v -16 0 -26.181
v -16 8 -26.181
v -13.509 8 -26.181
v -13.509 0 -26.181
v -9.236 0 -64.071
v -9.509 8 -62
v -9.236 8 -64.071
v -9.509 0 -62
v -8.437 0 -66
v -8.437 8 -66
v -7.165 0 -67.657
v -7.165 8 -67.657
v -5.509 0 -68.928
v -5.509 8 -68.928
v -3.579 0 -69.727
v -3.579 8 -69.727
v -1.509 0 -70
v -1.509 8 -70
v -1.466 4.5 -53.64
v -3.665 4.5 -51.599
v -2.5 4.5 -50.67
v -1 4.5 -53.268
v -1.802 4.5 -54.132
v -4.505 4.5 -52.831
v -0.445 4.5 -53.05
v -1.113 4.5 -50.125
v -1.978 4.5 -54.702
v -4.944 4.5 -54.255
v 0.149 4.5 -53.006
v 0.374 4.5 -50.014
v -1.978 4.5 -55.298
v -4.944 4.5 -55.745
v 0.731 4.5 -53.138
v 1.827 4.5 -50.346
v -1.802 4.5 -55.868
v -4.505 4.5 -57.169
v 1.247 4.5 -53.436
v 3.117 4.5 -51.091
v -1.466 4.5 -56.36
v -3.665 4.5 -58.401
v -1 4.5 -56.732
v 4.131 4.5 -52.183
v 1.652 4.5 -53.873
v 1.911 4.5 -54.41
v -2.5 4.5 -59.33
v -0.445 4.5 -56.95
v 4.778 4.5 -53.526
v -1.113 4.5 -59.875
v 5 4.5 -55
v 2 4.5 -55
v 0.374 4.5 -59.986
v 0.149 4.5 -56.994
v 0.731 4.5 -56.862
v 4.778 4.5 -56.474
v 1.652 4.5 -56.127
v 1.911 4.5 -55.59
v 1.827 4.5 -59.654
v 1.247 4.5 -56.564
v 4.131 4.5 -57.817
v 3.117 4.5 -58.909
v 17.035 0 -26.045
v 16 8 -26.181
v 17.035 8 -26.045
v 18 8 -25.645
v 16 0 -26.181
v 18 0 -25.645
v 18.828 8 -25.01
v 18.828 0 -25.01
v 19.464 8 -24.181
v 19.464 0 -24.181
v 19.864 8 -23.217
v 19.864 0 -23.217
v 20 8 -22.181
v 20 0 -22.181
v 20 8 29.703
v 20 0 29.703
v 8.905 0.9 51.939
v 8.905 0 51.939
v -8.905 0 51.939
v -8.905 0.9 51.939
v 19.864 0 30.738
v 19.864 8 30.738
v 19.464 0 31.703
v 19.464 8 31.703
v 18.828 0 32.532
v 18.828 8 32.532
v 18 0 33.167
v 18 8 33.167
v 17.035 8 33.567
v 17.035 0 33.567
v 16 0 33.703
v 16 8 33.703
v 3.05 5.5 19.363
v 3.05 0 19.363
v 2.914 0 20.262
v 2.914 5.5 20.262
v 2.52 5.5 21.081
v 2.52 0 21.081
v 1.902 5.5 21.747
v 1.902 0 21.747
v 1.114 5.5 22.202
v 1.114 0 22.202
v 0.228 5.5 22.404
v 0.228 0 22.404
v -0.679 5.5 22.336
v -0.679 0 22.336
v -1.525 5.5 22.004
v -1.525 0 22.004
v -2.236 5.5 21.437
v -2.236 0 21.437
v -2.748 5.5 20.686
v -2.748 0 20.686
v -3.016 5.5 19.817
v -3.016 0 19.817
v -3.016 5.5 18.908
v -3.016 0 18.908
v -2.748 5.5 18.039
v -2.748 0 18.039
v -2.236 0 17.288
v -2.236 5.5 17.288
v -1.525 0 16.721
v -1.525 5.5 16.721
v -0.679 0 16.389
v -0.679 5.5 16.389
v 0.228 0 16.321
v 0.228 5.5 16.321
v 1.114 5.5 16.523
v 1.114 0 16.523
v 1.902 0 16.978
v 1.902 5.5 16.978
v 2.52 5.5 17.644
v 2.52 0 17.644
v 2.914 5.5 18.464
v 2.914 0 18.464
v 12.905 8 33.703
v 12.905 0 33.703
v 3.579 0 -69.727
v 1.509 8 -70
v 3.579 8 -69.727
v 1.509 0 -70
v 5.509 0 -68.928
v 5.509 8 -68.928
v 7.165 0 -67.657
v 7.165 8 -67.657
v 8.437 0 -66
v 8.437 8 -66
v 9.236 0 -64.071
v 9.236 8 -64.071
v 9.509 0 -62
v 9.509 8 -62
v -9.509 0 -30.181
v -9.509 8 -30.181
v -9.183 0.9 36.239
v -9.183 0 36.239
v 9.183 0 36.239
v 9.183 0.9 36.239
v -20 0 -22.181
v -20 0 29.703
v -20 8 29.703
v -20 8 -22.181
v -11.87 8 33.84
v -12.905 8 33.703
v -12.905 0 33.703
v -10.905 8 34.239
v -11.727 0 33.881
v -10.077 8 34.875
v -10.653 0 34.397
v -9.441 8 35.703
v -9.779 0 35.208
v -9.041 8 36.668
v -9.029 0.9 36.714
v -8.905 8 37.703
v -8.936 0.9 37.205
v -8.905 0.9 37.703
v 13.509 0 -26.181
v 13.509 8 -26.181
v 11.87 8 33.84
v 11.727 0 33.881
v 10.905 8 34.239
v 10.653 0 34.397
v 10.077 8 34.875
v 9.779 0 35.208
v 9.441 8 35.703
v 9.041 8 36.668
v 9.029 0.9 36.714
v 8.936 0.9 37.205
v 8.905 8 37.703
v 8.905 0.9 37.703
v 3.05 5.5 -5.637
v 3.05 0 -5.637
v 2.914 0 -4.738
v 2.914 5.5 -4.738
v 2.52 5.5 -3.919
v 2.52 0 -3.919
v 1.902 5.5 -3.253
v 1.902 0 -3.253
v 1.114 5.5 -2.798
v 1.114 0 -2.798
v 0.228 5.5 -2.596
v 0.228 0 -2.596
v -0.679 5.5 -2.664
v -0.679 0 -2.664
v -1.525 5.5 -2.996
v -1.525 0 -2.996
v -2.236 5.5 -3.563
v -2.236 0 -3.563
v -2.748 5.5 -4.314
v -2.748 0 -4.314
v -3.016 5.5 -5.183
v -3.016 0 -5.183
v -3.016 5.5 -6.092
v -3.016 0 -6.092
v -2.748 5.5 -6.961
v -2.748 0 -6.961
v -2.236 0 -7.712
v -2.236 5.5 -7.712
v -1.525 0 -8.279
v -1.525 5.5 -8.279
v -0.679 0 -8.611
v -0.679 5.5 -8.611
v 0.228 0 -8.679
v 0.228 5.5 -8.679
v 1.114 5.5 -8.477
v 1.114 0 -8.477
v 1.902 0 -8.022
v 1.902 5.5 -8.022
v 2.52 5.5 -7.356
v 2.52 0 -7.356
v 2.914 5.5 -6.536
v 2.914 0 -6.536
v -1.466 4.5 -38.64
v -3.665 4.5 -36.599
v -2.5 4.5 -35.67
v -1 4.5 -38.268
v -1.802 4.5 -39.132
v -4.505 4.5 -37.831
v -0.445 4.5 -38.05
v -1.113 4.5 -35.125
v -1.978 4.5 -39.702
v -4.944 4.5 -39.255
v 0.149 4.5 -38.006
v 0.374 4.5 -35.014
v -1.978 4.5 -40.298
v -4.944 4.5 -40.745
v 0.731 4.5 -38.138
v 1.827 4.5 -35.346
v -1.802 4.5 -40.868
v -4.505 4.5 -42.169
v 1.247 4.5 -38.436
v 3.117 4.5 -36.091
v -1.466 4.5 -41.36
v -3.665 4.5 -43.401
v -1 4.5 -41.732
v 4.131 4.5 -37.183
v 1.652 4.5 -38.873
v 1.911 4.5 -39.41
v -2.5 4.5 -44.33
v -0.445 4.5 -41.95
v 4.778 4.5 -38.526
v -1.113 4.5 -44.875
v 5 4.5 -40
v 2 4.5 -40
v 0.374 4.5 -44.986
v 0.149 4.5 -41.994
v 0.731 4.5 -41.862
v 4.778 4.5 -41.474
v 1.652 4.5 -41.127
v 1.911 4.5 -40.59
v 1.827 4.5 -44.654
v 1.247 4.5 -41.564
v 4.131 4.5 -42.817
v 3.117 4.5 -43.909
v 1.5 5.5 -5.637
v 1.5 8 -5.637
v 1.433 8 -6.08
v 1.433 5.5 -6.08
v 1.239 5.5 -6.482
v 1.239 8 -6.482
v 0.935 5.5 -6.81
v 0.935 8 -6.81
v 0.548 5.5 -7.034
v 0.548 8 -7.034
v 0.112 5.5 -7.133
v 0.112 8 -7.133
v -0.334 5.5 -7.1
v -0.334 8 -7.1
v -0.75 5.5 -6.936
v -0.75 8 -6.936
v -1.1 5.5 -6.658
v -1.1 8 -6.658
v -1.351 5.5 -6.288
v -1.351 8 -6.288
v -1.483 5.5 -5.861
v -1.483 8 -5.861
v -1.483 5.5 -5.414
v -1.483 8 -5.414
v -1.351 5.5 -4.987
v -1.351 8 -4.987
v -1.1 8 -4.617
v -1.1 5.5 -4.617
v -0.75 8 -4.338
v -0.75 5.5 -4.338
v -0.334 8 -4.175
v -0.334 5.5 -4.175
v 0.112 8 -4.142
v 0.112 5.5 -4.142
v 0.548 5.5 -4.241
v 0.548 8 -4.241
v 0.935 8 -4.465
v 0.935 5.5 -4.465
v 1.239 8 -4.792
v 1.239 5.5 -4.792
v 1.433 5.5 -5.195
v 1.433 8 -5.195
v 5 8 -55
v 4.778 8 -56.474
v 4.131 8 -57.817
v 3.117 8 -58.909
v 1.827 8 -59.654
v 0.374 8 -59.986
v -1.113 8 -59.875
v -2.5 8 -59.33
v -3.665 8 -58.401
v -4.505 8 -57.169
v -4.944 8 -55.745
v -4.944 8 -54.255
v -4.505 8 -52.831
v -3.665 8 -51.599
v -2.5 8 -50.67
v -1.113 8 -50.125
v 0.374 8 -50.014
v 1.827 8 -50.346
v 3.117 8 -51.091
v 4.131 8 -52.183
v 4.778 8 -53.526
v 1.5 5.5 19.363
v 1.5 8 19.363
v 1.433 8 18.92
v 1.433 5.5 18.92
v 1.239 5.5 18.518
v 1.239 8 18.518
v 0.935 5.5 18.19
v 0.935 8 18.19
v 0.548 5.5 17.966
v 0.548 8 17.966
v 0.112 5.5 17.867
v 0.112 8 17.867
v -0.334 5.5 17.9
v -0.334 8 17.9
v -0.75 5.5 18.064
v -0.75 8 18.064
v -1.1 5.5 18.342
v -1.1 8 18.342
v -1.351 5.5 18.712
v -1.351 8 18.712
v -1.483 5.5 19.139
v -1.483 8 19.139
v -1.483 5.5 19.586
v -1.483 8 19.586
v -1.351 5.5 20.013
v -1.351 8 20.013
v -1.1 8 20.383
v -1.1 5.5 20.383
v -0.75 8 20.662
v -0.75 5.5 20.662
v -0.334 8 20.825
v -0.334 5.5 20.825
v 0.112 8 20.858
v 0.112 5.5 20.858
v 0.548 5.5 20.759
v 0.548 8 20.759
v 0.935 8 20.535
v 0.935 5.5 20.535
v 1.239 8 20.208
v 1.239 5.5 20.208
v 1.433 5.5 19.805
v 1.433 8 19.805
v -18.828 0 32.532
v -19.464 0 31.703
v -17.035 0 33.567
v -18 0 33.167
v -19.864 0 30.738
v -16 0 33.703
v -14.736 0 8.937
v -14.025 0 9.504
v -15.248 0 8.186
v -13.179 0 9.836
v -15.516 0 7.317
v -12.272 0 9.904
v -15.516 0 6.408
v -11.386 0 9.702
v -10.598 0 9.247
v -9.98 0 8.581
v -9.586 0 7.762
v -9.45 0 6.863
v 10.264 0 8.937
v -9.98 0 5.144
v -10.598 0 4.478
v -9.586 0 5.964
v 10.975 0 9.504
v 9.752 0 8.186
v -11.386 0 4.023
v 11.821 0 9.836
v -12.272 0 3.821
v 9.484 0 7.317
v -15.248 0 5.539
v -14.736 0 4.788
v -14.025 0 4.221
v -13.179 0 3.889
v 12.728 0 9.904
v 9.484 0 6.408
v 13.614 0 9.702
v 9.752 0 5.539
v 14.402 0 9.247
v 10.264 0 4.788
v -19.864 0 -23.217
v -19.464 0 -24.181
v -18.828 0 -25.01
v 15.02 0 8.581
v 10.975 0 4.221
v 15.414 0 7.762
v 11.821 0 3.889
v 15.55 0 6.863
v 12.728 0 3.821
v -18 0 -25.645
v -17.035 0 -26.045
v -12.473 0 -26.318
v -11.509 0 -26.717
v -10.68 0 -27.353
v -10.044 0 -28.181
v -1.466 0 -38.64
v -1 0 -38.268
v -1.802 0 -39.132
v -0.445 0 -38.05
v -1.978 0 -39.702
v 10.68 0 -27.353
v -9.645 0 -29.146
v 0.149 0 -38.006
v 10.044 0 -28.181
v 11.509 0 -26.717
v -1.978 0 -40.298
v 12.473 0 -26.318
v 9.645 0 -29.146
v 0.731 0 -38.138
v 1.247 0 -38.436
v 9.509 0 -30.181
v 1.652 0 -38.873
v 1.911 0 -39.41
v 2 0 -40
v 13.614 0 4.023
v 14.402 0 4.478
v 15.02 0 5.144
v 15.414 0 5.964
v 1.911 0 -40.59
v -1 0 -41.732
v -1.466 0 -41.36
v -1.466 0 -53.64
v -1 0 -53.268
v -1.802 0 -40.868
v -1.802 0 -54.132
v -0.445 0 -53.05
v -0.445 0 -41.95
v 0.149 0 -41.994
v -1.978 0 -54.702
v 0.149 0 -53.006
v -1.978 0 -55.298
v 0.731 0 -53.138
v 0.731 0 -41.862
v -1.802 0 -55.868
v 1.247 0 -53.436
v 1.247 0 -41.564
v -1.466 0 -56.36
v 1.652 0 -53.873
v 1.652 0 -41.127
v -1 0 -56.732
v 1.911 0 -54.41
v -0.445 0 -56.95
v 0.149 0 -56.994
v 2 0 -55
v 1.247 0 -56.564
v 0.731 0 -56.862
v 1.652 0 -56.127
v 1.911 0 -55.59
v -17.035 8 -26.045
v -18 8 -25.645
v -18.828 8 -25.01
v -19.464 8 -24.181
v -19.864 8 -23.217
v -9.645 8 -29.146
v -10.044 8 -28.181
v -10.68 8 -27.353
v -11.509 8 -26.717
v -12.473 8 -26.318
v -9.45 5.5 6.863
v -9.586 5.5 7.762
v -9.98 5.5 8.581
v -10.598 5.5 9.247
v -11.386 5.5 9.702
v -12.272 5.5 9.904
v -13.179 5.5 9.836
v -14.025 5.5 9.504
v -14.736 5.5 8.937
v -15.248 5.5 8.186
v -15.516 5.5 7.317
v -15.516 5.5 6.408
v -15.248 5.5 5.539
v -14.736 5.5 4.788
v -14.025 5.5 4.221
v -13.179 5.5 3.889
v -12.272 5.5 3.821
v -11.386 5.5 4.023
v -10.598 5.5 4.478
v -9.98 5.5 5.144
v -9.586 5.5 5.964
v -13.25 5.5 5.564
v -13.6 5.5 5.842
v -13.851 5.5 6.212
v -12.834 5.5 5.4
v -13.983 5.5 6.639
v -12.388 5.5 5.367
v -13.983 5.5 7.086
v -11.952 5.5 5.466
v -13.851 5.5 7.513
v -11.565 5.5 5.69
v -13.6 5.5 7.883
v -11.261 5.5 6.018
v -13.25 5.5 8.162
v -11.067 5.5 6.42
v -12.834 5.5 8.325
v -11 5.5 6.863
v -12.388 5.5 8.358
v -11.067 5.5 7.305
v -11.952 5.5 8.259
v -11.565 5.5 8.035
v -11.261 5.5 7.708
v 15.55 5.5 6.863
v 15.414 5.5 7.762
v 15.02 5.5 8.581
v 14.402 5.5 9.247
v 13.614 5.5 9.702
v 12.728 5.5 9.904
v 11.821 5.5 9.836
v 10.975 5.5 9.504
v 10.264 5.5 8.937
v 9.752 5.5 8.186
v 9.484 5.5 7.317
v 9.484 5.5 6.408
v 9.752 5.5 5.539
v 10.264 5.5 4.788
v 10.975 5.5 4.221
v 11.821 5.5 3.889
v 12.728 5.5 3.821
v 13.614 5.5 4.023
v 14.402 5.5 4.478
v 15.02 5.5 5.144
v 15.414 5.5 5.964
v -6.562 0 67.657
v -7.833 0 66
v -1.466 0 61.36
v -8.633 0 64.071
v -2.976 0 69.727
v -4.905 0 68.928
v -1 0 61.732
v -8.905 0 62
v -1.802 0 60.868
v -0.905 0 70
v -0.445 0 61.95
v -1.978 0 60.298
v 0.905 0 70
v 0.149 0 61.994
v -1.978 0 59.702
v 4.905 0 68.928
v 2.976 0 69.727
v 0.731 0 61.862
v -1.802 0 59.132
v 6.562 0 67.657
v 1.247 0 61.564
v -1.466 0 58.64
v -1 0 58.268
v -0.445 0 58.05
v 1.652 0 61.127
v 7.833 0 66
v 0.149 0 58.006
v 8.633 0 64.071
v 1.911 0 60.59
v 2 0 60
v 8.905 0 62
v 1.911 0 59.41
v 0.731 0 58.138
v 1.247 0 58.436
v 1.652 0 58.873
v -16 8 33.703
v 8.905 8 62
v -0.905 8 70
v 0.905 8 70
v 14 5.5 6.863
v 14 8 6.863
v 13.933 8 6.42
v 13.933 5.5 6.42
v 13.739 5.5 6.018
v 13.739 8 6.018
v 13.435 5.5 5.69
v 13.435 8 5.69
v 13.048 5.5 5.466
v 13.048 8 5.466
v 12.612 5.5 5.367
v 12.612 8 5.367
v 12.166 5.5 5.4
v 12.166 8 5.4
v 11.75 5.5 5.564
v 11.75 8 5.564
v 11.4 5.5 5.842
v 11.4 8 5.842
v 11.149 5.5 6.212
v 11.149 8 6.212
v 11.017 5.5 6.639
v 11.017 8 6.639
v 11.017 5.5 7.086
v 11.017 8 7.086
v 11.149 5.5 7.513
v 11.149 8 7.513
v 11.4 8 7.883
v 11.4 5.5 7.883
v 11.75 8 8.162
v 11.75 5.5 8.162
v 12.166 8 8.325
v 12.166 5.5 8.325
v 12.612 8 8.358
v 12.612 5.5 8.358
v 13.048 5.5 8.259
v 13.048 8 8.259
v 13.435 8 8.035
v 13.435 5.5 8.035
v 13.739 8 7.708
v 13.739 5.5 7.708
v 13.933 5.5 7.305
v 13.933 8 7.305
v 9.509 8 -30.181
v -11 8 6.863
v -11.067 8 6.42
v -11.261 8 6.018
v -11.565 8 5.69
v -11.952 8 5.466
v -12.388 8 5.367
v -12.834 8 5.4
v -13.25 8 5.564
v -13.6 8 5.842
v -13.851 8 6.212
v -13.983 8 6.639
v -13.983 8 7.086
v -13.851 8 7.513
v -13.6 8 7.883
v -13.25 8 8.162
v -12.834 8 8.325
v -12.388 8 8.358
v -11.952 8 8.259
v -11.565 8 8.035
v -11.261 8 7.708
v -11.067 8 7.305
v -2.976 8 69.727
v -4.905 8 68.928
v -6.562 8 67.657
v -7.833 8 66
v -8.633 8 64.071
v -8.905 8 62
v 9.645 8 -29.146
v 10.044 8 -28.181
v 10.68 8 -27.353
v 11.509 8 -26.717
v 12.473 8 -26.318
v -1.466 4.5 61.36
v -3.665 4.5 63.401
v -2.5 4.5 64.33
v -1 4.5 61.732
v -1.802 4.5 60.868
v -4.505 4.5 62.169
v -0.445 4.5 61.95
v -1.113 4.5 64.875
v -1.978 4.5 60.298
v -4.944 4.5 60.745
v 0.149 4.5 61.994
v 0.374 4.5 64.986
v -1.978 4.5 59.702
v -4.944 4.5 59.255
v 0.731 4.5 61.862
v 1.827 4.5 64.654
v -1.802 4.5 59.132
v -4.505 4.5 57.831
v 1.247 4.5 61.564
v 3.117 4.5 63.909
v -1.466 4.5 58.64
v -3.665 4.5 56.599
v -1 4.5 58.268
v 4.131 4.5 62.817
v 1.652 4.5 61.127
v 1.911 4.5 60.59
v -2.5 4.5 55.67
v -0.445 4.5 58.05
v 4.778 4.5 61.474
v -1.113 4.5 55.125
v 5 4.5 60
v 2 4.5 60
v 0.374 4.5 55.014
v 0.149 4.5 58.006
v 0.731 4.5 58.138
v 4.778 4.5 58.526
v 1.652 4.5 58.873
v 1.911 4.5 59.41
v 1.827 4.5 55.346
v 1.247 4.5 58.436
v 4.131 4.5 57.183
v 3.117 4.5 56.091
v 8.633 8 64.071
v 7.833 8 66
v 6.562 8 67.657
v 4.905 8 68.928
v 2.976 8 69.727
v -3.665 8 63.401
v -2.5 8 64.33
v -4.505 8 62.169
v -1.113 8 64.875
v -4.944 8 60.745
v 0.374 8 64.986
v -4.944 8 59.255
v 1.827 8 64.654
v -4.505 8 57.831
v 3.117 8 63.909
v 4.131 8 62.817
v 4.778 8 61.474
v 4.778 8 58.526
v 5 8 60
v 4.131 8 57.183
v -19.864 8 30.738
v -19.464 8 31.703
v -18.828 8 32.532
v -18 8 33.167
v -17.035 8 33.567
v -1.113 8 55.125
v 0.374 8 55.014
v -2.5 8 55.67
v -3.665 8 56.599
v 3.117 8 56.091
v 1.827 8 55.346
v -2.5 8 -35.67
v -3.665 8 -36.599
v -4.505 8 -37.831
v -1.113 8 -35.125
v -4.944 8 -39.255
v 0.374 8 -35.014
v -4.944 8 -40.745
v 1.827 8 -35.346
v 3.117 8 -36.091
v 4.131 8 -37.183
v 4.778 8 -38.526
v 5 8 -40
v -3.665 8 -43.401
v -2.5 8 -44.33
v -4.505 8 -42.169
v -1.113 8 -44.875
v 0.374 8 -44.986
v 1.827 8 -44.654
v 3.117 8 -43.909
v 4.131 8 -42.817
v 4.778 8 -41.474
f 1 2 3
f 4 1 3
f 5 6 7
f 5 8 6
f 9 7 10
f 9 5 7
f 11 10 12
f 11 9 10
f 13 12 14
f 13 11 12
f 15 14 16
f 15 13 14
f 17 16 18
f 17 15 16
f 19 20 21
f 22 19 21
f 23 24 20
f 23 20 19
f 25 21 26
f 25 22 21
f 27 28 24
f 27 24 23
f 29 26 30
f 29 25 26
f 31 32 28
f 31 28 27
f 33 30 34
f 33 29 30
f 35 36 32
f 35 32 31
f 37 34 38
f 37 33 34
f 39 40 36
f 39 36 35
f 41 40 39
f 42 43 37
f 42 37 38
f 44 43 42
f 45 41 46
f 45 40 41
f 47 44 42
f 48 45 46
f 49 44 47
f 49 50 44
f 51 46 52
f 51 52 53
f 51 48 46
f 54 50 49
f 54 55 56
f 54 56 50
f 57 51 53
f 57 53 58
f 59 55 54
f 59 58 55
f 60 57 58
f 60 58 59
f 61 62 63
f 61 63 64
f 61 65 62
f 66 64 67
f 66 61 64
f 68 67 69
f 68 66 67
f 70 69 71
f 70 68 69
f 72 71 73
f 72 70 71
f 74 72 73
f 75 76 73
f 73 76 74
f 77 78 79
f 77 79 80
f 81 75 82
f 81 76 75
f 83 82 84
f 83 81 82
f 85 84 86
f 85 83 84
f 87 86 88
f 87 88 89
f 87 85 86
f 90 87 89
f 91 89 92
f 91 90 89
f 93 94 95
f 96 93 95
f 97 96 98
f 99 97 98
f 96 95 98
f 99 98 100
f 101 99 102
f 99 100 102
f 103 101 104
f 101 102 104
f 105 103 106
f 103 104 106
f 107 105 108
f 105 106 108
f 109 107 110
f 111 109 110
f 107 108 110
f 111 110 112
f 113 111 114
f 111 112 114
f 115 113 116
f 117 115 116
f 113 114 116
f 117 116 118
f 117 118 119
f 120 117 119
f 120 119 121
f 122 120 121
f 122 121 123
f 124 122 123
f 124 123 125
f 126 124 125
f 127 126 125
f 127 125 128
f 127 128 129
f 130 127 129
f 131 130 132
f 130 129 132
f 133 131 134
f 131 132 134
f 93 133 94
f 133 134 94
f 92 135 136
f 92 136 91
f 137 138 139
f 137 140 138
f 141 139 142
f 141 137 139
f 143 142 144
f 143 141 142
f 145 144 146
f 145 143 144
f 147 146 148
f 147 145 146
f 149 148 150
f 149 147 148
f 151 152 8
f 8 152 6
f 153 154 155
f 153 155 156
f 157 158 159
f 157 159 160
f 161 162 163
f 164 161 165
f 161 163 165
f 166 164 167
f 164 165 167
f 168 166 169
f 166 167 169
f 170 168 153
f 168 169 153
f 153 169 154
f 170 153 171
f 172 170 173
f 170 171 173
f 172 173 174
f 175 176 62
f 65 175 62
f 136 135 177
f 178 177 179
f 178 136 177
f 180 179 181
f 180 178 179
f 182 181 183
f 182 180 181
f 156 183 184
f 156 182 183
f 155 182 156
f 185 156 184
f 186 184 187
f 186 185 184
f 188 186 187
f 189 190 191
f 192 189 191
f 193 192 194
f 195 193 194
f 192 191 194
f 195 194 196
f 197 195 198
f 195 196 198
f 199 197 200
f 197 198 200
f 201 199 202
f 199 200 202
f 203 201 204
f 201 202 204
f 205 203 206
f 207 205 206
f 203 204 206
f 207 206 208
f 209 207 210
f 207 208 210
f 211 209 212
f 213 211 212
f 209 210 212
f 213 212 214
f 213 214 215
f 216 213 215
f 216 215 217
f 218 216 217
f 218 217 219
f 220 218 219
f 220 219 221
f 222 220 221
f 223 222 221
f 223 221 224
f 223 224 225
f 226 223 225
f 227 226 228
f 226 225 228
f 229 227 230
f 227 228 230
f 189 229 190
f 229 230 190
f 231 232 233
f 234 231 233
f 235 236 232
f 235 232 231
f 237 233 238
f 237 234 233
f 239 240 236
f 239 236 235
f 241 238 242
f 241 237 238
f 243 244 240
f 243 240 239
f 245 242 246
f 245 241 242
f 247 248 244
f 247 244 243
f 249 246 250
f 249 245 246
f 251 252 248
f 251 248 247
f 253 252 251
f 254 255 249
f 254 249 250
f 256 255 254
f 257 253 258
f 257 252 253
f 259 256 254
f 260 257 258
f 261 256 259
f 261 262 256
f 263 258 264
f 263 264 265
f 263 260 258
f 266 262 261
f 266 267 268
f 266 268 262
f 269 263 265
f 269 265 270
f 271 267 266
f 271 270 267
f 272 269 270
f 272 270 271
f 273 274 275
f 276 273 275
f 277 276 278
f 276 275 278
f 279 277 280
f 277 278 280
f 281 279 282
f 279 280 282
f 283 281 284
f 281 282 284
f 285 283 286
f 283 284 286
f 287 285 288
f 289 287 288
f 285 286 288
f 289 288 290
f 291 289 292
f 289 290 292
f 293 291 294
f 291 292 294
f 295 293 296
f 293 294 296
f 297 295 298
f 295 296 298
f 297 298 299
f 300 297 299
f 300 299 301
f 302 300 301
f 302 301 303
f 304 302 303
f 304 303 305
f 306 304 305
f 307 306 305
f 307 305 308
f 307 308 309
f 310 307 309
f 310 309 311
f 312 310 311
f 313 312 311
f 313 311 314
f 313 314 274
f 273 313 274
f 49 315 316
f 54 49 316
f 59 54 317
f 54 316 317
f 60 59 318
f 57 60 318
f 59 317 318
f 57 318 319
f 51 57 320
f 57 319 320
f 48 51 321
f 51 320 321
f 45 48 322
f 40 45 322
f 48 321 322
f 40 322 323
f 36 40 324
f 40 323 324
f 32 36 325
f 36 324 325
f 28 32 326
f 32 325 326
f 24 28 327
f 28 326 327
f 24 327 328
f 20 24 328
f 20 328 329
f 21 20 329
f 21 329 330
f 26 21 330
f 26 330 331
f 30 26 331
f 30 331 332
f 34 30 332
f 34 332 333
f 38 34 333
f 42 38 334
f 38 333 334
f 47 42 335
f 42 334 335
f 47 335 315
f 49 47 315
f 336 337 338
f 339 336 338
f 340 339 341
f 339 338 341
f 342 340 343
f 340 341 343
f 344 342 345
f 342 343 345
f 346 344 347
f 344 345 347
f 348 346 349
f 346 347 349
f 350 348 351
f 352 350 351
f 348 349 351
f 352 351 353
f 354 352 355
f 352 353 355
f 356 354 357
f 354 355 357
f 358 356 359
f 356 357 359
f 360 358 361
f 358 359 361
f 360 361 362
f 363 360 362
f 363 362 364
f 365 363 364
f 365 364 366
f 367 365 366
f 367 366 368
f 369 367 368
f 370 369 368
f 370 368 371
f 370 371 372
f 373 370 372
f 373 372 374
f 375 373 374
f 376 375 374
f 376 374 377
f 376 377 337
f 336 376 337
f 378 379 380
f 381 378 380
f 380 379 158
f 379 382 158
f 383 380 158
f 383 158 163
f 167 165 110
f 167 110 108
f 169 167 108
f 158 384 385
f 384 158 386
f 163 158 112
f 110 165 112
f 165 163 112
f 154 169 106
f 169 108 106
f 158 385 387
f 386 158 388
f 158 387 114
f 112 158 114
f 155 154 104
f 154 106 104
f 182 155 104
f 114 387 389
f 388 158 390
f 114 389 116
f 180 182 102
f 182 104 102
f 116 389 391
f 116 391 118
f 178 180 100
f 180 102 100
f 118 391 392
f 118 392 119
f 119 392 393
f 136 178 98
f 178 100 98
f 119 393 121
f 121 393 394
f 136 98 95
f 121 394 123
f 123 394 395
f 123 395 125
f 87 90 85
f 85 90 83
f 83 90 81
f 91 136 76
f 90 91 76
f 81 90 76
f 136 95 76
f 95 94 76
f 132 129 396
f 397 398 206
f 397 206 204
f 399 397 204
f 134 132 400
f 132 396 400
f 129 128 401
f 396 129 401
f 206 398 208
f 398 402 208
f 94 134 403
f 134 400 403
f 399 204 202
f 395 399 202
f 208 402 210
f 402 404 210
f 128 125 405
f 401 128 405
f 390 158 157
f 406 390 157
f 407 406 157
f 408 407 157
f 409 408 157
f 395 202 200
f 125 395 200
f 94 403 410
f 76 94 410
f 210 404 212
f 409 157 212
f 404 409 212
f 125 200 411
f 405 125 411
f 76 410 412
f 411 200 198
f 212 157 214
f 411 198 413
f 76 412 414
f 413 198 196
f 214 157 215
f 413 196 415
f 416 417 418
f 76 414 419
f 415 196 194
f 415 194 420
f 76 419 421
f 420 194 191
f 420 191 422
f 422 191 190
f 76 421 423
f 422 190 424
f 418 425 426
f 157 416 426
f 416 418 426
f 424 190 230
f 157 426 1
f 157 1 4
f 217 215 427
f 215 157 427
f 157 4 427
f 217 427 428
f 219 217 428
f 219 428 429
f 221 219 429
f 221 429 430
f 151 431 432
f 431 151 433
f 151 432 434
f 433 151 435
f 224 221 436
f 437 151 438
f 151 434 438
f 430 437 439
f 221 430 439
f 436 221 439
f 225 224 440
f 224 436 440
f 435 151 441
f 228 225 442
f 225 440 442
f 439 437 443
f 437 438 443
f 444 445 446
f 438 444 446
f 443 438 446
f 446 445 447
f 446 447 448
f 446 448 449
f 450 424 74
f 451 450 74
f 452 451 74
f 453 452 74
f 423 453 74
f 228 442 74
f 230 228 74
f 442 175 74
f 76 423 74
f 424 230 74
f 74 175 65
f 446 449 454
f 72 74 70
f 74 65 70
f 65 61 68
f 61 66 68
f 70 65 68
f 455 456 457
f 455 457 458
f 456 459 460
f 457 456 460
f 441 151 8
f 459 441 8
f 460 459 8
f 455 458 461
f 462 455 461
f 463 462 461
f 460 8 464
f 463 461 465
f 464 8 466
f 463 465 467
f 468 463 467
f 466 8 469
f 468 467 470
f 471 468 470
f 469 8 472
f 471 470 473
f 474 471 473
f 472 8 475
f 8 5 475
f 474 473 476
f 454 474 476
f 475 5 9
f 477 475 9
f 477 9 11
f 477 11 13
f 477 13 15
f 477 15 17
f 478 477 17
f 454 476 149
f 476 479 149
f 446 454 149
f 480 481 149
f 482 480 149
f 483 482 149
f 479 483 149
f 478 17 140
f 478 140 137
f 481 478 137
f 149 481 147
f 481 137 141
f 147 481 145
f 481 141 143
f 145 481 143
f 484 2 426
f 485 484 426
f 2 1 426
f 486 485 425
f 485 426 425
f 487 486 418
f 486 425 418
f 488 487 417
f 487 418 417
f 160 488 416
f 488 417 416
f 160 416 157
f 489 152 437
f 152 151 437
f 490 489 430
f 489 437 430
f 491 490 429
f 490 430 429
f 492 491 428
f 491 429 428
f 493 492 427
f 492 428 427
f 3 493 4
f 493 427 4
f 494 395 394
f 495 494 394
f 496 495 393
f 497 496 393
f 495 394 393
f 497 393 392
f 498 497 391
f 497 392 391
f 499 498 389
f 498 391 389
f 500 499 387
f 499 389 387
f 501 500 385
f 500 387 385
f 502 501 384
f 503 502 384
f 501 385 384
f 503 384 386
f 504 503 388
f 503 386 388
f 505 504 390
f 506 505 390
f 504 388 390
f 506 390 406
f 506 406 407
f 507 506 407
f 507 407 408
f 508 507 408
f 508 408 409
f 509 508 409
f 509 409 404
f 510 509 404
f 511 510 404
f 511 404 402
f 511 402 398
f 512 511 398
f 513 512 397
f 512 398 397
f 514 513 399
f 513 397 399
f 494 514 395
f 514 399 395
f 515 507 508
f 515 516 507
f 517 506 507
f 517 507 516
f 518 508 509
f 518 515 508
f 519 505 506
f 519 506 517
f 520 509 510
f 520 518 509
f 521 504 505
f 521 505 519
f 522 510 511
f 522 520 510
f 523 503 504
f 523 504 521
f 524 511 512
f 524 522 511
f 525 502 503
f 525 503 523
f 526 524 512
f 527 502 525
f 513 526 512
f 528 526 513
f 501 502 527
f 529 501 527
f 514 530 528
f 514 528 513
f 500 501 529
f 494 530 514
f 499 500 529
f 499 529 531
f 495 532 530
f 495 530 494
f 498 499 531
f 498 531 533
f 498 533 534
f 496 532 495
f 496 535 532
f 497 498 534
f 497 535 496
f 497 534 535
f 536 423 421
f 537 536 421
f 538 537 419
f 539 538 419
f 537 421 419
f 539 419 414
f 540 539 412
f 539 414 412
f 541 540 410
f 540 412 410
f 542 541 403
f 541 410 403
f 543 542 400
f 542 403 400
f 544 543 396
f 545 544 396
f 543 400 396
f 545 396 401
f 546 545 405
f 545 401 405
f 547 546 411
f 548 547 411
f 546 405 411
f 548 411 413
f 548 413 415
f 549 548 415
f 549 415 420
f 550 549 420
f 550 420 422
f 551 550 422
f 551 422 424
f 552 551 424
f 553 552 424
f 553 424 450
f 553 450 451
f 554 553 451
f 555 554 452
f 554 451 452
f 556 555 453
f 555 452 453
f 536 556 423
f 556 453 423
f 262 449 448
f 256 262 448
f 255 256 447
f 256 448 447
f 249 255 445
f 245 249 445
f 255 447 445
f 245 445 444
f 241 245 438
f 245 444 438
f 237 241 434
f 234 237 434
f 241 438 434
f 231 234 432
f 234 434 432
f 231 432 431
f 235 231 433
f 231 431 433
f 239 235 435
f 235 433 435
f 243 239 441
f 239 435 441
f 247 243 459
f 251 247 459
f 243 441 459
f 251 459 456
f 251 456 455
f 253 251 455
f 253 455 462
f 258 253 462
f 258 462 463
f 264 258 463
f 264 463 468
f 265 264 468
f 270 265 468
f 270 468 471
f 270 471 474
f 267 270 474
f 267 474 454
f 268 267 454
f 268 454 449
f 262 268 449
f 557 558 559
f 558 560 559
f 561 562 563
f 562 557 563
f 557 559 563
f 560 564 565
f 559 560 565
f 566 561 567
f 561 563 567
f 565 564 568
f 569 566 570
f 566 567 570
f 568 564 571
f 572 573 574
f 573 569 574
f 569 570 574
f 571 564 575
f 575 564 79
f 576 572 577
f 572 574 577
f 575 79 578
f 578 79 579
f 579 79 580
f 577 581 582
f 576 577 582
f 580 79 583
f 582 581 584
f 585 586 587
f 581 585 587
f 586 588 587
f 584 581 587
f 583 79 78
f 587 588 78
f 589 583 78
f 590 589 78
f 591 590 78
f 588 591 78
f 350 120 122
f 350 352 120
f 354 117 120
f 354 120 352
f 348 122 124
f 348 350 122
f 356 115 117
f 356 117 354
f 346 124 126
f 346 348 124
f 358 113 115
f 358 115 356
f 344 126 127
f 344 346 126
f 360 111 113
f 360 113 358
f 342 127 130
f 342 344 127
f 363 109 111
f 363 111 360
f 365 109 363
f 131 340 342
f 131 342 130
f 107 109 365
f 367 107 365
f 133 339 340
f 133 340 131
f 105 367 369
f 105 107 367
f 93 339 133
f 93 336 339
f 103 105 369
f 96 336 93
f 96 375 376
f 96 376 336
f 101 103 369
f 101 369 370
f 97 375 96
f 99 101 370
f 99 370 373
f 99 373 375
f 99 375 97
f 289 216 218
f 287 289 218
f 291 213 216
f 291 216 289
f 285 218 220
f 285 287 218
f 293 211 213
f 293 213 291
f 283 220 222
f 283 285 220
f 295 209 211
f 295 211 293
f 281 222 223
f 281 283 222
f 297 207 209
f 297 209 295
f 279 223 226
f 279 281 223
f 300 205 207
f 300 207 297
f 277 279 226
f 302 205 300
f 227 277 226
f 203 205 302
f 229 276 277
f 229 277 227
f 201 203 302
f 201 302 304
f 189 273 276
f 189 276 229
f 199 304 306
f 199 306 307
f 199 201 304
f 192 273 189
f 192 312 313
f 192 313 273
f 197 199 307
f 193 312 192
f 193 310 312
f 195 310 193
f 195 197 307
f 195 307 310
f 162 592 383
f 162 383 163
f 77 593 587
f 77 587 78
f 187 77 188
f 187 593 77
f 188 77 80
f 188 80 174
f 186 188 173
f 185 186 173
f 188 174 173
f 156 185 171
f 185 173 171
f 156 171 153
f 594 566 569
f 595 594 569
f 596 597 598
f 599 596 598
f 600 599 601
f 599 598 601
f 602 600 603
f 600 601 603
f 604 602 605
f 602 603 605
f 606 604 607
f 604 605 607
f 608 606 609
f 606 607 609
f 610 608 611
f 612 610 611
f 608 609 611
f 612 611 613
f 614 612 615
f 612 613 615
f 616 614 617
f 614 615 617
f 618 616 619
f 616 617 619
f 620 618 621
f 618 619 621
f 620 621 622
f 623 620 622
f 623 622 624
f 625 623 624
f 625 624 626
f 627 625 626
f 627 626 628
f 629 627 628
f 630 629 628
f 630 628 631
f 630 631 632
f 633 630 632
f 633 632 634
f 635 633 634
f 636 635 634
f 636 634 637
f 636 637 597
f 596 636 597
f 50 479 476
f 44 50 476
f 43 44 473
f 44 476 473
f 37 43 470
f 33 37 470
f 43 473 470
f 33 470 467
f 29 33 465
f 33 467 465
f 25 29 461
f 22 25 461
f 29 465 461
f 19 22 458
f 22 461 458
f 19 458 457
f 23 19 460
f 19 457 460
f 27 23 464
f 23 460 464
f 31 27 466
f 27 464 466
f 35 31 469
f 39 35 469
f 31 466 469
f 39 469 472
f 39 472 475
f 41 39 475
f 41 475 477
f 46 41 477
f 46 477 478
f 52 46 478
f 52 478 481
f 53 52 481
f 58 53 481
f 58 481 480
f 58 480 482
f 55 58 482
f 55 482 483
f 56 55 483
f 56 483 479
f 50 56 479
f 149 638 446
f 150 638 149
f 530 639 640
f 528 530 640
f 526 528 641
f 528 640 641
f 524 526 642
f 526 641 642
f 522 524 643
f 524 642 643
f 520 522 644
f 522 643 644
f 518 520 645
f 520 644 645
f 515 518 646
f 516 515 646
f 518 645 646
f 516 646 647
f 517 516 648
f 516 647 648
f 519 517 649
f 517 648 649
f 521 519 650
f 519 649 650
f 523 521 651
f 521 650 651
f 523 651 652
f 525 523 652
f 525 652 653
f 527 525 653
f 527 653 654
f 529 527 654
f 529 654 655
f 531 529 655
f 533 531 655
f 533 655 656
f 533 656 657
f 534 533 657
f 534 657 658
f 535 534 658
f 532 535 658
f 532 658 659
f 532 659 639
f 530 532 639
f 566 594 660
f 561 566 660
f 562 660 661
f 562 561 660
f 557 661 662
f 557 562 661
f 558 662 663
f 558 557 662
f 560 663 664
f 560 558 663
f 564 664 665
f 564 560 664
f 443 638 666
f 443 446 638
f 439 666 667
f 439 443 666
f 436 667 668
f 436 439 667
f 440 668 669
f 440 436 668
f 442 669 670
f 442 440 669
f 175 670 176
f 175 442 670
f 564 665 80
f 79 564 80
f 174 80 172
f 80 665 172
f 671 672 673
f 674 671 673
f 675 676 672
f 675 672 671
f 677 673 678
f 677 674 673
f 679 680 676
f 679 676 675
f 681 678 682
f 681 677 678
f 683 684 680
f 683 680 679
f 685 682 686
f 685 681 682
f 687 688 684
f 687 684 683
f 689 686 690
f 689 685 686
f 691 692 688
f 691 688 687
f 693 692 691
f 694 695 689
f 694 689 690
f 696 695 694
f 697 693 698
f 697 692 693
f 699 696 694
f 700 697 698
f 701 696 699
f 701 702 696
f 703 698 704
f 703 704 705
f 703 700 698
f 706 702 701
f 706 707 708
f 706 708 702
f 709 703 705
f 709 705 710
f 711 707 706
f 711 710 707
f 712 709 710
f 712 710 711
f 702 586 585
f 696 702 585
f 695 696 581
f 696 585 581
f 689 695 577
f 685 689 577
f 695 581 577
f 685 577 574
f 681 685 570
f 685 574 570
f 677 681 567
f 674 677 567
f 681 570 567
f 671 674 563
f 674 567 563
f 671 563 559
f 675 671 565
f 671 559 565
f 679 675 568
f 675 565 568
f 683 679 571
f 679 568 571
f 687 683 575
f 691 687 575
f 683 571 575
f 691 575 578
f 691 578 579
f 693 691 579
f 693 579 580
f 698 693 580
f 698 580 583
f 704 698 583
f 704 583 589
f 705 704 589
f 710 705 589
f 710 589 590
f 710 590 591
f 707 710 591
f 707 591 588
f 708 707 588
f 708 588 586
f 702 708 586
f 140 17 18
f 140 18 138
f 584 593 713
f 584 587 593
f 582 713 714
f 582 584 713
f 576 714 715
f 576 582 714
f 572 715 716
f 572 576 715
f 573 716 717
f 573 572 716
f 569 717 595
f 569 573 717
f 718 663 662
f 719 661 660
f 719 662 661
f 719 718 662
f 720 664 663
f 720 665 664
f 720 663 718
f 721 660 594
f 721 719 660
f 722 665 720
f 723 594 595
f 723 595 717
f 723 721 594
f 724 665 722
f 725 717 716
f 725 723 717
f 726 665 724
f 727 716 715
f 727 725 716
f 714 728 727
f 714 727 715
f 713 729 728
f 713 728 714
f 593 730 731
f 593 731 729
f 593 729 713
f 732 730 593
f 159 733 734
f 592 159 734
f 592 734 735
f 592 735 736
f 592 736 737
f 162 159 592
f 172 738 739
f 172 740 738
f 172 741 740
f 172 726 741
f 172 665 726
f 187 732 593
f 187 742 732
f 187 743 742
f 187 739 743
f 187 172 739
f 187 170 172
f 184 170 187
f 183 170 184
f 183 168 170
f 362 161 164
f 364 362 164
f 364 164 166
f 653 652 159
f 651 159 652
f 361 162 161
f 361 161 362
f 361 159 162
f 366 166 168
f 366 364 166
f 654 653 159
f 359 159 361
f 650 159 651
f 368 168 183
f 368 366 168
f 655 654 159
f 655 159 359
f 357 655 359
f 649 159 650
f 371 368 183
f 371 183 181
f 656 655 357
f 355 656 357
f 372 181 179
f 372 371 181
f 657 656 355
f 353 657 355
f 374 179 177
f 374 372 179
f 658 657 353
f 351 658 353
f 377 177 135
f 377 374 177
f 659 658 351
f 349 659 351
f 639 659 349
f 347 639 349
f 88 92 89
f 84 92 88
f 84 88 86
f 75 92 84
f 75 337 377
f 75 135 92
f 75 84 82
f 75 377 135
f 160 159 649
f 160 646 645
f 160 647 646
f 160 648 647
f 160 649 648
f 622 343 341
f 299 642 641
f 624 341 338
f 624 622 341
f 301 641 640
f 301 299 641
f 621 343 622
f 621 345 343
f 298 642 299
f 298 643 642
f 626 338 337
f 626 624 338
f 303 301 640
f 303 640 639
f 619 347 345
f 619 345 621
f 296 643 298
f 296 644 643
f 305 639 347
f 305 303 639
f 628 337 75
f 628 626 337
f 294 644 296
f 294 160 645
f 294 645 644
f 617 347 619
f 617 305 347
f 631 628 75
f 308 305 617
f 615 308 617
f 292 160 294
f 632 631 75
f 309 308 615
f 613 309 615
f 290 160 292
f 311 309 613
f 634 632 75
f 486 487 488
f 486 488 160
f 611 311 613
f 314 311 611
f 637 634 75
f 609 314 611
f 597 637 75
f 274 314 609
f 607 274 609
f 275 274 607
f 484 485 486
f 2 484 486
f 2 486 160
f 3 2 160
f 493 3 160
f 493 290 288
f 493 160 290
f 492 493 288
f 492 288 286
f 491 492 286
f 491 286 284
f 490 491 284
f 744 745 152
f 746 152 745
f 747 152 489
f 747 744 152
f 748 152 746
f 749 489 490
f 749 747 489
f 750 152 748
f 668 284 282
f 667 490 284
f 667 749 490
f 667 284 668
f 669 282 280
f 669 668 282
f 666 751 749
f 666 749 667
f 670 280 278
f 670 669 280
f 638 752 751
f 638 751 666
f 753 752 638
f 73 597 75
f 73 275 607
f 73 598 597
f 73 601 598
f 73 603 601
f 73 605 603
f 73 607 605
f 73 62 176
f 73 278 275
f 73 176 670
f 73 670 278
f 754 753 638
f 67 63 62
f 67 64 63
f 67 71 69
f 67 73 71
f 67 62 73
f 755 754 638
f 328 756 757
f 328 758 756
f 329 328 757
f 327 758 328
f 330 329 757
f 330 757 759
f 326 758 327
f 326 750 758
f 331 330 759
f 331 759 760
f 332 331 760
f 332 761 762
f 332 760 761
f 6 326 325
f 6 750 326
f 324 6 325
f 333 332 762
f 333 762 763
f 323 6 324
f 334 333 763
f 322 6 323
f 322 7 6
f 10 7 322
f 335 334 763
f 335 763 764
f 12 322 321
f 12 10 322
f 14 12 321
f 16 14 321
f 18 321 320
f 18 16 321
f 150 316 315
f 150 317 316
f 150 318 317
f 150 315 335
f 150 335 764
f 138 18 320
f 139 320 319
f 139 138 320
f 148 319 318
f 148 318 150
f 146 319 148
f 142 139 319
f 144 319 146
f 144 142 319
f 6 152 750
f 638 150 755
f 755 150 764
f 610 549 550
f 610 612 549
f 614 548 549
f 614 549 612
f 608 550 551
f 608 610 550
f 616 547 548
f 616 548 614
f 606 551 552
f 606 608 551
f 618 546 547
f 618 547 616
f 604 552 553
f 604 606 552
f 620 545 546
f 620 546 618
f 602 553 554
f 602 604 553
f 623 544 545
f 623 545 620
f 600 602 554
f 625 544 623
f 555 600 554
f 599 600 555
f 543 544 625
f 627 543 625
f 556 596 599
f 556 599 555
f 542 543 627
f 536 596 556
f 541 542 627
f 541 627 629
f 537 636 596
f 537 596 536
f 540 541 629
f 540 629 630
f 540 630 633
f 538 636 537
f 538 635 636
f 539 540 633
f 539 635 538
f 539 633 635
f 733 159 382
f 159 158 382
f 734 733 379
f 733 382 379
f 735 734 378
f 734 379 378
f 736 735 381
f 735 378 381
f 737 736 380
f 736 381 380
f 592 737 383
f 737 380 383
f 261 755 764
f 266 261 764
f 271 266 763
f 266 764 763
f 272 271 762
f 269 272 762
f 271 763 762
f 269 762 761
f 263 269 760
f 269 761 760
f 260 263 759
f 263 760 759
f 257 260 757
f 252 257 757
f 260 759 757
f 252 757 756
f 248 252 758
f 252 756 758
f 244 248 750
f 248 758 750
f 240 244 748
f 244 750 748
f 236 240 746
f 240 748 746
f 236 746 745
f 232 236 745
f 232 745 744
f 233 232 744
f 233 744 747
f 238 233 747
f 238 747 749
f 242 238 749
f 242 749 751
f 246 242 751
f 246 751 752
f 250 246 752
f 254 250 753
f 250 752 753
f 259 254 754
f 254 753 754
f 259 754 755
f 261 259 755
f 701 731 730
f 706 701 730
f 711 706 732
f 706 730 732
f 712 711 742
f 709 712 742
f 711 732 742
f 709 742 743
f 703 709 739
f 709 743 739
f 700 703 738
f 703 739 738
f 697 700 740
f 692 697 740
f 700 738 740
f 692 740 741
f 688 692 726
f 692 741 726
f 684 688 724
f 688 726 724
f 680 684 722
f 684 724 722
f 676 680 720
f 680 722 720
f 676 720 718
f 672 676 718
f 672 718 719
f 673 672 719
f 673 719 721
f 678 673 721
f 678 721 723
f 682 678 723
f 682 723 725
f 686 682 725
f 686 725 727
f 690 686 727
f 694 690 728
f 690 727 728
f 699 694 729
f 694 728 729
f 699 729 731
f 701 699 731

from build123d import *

# Parameters (mm, degrees)
SKETCH1_W               = 40
SKETCH1_H               = 140
BOSS_EXTRUDE1_DEPTH     = 8
SKETCH2_W               = 10.491495072
SKETCH2_H               = 43.818703547
SKETCH2_W_2             = 11.094869632
SKETCH2_H_2             = 36.296784829
CUT_EXTRUDE1_DEPTH      = 1
CUT_EXTRUDE1_DEPTH_BACK = 9
FILLET3_R               = 8
FILLET4_R               = 4
SKETCH3_R               = 1.5
CUT_EXTRUDE2_DEPTH      = 1
CUT_EXTRUDE2_DEPTH_BACK = 9
SKETCH4_W               = 15.7
SKETCH4_H               = 0.9
CUT_EXTRUDE3_DEPTH      = 12.094869632
CUT_EXTRUDE3_DEPTH_BACK = 29.905130368
SKETCH5_R               = 3.05
CUT_EXTRUDE4_DEPTH      = 5.5
SKETCH6_R               = 2
CUT_EXTRUDE5_DEPTH      = 1
CUT_EXTRUDE5_DEPTH_BACK = 9
SKETCH7_R               = 5
CUT_EXTRUDE6_DEPTH      = 3.5


with BuildPart() as part:
    # Sketch1 → Boss-Extrude1 (new body)
    with BuildSketch(Plane(origin=(0, 0, 0), x_dir=(1, 0, 0), z_dir=(0, 1, 0))):
        Rectangle(SKETCH1_W, SKETCH1_H)
    extrude(amount=BOSS_EXTRUDE1_DEPTH)

    # Sketch2 → Cut-Extrude1 (cut, two sides)
    with BuildSketch(Plane(origin=(0, 8, 0), x_dir=(1, 0, 0), z_dir=(0, 1, 0))) as cut_extrude1_sk:
        with Locations((14.754252464, 48.090648227)):
            Rectangle(SKETCH2_W, SKETCH2_H)
        with Locations((-14.452565184, -51.851607586)):
            Rectangle(SKETCH2_W_2, SKETCH2_H_2)
        with Locations((14.452565184, -51.851607586)):
            Rectangle(SKETCH2_W_2, SKETCH2_H_2)
        with Locations((-14.754252464, 48.090648227)):
            Rectangle(SKETCH2_W, SKETCH2_H)
    extrude(amount=CUT_EXTRUDE1_DEPTH, mode=Mode.SUBTRACT)
    extrude(cut_extrude1_sk.sketch, amount=-CUT_EXTRUDE1_DEPTH_BACK, mode=Mode.SUBTRACT)

    # Fillet3
    fillet3_edges = [part.edges().sort_by_distance(p)[0] for p in [
        (-9.508504928, 4, -70),
        (8.905130368, 4, 70),
        (-8.905130368, 4, 70),
        (9.508504928, 4, -70),
    ]]
    fillet(fillet3_edges, radius=FILLET3_R)

    # Fillet4
    fillet4_edges = [part.edges().sort_by_distance(p)[0] for p in [
        (-9.508504928, 4, -26.181296453),
        (-20, 4, -26.181296453),
        (8.905130368, 4, 33.703215171),
        (20, 4, 33.703215171),
        (-8.905130368, 4, 33.703215171),
        (-20, 4, 33.703215171),
        (9.508504928, 4, -26.181296453),
        (20, 4, -26.181296453),
    ]]
    fillet(fillet4_edges, radius=FILLET4_R)

    # Sketch3 → Cut-Extrude2 (cut, two sides)
    with BuildSketch(Plane(origin=(0, 8, 0), x_dir=(1, 0, 0), z_dir=(0, 1, 0))) as cut_extrude2_sk:
        with Locations((12.5, -6.862591123)):
            Circle(SKETCH3_R)
        with Locations((0, 5.637408877)):
            Circle(SKETCH3_R)
        with Locations((-12.5, -6.862591123)):
            Circle(SKETCH3_R)
        with Locations((0, -19.362591123)):
            Circle(SKETCH3_R)
    extrude(amount=CUT_EXTRUDE2_DEPTH, mode=Mode.SUBTRACT)
    extrude(cut_extrude2_sk.sketch, amount=-CUT_EXTRUDE2_DEPTH_BACK, mode=Mode.SUBTRACT)

    # Sketch4 → Cut-Extrude3 (cut, two sides)
    with BuildSketch(Plane(origin=(8.905130368, 0, 0), x_dir=(0, 0, -1), z_dir=(1, 0, 0))) as cut_extrude3_sk:
        with Locations((-44.089134708, 0.45)):
            Rectangle(SKETCH4_W, SKETCH4_H)
    extrude(amount=CUT_EXTRUDE3_DEPTH, mode=Mode.SUBTRACT)
    extrude(cut_extrude3_sk.sketch, amount=-CUT_EXTRUDE3_DEPTH_BACK, mode=Mode.SUBTRACT)

    # Sketch5 → Cut-Extrude4 (cut)
    with BuildSketch(Plane.XZ):
        with Locations((12.5, 6.862591123)):
            Circle(SKETCH5_R)
        with Locations((0, -5.637408877)):
            Circle(SKETCH5_R)
        with Locations((-12.5, 6.862591123)):
            Circle(SKETCH5_R)
        with Locations((0, 19.362591123)):
            Circle(SKETCH5_R)
    extrude(amount=-CUT_EXTRUDE4_DEPTH, mode=Mode.SUBTRACT)

    # Sketch6 → Cut-Extrude5 (cut, two sides)
    with BuildSketch(Plane.XZ) as cut_extrude5_sk:
        with Locations((0, 60)):
            Circle(SKETCH6_R)
        with Locations((0, -55)):
            Circle(SKETCH6_R)
        with Locations((0, -40)):
            Circle(SKETCH6_R)
    extrude(amount=CUT_EXTRUDE5_DEPTH, mode=Mode.SUBTRACT)
    extrude(cut_extrude5_sk.sketch, amount=-CUT_EXTRUDE5_DEPTH_BACK, mode=Mode.SUBTRACT)

    # Sketch7 → Cut-Extrude6 (cut)
    with BuildSketch(Plane(origin=(0, 8, 0), x_dir=(1, 0, 0), z_dir=(0, 1, 0))):
        with Locations((0, 55)):
            Circle(SKETCH7_R)
        with Locations((0, -60)):
            Circle(SKETCH7_R)
        with Locations((0, 40)):
            Circle(SKETCH7_R)
    extrude(amount=-CUT_EXTRUDE6_DEPTH, mode=Mode.SUBTRACT)


solid = part.part
